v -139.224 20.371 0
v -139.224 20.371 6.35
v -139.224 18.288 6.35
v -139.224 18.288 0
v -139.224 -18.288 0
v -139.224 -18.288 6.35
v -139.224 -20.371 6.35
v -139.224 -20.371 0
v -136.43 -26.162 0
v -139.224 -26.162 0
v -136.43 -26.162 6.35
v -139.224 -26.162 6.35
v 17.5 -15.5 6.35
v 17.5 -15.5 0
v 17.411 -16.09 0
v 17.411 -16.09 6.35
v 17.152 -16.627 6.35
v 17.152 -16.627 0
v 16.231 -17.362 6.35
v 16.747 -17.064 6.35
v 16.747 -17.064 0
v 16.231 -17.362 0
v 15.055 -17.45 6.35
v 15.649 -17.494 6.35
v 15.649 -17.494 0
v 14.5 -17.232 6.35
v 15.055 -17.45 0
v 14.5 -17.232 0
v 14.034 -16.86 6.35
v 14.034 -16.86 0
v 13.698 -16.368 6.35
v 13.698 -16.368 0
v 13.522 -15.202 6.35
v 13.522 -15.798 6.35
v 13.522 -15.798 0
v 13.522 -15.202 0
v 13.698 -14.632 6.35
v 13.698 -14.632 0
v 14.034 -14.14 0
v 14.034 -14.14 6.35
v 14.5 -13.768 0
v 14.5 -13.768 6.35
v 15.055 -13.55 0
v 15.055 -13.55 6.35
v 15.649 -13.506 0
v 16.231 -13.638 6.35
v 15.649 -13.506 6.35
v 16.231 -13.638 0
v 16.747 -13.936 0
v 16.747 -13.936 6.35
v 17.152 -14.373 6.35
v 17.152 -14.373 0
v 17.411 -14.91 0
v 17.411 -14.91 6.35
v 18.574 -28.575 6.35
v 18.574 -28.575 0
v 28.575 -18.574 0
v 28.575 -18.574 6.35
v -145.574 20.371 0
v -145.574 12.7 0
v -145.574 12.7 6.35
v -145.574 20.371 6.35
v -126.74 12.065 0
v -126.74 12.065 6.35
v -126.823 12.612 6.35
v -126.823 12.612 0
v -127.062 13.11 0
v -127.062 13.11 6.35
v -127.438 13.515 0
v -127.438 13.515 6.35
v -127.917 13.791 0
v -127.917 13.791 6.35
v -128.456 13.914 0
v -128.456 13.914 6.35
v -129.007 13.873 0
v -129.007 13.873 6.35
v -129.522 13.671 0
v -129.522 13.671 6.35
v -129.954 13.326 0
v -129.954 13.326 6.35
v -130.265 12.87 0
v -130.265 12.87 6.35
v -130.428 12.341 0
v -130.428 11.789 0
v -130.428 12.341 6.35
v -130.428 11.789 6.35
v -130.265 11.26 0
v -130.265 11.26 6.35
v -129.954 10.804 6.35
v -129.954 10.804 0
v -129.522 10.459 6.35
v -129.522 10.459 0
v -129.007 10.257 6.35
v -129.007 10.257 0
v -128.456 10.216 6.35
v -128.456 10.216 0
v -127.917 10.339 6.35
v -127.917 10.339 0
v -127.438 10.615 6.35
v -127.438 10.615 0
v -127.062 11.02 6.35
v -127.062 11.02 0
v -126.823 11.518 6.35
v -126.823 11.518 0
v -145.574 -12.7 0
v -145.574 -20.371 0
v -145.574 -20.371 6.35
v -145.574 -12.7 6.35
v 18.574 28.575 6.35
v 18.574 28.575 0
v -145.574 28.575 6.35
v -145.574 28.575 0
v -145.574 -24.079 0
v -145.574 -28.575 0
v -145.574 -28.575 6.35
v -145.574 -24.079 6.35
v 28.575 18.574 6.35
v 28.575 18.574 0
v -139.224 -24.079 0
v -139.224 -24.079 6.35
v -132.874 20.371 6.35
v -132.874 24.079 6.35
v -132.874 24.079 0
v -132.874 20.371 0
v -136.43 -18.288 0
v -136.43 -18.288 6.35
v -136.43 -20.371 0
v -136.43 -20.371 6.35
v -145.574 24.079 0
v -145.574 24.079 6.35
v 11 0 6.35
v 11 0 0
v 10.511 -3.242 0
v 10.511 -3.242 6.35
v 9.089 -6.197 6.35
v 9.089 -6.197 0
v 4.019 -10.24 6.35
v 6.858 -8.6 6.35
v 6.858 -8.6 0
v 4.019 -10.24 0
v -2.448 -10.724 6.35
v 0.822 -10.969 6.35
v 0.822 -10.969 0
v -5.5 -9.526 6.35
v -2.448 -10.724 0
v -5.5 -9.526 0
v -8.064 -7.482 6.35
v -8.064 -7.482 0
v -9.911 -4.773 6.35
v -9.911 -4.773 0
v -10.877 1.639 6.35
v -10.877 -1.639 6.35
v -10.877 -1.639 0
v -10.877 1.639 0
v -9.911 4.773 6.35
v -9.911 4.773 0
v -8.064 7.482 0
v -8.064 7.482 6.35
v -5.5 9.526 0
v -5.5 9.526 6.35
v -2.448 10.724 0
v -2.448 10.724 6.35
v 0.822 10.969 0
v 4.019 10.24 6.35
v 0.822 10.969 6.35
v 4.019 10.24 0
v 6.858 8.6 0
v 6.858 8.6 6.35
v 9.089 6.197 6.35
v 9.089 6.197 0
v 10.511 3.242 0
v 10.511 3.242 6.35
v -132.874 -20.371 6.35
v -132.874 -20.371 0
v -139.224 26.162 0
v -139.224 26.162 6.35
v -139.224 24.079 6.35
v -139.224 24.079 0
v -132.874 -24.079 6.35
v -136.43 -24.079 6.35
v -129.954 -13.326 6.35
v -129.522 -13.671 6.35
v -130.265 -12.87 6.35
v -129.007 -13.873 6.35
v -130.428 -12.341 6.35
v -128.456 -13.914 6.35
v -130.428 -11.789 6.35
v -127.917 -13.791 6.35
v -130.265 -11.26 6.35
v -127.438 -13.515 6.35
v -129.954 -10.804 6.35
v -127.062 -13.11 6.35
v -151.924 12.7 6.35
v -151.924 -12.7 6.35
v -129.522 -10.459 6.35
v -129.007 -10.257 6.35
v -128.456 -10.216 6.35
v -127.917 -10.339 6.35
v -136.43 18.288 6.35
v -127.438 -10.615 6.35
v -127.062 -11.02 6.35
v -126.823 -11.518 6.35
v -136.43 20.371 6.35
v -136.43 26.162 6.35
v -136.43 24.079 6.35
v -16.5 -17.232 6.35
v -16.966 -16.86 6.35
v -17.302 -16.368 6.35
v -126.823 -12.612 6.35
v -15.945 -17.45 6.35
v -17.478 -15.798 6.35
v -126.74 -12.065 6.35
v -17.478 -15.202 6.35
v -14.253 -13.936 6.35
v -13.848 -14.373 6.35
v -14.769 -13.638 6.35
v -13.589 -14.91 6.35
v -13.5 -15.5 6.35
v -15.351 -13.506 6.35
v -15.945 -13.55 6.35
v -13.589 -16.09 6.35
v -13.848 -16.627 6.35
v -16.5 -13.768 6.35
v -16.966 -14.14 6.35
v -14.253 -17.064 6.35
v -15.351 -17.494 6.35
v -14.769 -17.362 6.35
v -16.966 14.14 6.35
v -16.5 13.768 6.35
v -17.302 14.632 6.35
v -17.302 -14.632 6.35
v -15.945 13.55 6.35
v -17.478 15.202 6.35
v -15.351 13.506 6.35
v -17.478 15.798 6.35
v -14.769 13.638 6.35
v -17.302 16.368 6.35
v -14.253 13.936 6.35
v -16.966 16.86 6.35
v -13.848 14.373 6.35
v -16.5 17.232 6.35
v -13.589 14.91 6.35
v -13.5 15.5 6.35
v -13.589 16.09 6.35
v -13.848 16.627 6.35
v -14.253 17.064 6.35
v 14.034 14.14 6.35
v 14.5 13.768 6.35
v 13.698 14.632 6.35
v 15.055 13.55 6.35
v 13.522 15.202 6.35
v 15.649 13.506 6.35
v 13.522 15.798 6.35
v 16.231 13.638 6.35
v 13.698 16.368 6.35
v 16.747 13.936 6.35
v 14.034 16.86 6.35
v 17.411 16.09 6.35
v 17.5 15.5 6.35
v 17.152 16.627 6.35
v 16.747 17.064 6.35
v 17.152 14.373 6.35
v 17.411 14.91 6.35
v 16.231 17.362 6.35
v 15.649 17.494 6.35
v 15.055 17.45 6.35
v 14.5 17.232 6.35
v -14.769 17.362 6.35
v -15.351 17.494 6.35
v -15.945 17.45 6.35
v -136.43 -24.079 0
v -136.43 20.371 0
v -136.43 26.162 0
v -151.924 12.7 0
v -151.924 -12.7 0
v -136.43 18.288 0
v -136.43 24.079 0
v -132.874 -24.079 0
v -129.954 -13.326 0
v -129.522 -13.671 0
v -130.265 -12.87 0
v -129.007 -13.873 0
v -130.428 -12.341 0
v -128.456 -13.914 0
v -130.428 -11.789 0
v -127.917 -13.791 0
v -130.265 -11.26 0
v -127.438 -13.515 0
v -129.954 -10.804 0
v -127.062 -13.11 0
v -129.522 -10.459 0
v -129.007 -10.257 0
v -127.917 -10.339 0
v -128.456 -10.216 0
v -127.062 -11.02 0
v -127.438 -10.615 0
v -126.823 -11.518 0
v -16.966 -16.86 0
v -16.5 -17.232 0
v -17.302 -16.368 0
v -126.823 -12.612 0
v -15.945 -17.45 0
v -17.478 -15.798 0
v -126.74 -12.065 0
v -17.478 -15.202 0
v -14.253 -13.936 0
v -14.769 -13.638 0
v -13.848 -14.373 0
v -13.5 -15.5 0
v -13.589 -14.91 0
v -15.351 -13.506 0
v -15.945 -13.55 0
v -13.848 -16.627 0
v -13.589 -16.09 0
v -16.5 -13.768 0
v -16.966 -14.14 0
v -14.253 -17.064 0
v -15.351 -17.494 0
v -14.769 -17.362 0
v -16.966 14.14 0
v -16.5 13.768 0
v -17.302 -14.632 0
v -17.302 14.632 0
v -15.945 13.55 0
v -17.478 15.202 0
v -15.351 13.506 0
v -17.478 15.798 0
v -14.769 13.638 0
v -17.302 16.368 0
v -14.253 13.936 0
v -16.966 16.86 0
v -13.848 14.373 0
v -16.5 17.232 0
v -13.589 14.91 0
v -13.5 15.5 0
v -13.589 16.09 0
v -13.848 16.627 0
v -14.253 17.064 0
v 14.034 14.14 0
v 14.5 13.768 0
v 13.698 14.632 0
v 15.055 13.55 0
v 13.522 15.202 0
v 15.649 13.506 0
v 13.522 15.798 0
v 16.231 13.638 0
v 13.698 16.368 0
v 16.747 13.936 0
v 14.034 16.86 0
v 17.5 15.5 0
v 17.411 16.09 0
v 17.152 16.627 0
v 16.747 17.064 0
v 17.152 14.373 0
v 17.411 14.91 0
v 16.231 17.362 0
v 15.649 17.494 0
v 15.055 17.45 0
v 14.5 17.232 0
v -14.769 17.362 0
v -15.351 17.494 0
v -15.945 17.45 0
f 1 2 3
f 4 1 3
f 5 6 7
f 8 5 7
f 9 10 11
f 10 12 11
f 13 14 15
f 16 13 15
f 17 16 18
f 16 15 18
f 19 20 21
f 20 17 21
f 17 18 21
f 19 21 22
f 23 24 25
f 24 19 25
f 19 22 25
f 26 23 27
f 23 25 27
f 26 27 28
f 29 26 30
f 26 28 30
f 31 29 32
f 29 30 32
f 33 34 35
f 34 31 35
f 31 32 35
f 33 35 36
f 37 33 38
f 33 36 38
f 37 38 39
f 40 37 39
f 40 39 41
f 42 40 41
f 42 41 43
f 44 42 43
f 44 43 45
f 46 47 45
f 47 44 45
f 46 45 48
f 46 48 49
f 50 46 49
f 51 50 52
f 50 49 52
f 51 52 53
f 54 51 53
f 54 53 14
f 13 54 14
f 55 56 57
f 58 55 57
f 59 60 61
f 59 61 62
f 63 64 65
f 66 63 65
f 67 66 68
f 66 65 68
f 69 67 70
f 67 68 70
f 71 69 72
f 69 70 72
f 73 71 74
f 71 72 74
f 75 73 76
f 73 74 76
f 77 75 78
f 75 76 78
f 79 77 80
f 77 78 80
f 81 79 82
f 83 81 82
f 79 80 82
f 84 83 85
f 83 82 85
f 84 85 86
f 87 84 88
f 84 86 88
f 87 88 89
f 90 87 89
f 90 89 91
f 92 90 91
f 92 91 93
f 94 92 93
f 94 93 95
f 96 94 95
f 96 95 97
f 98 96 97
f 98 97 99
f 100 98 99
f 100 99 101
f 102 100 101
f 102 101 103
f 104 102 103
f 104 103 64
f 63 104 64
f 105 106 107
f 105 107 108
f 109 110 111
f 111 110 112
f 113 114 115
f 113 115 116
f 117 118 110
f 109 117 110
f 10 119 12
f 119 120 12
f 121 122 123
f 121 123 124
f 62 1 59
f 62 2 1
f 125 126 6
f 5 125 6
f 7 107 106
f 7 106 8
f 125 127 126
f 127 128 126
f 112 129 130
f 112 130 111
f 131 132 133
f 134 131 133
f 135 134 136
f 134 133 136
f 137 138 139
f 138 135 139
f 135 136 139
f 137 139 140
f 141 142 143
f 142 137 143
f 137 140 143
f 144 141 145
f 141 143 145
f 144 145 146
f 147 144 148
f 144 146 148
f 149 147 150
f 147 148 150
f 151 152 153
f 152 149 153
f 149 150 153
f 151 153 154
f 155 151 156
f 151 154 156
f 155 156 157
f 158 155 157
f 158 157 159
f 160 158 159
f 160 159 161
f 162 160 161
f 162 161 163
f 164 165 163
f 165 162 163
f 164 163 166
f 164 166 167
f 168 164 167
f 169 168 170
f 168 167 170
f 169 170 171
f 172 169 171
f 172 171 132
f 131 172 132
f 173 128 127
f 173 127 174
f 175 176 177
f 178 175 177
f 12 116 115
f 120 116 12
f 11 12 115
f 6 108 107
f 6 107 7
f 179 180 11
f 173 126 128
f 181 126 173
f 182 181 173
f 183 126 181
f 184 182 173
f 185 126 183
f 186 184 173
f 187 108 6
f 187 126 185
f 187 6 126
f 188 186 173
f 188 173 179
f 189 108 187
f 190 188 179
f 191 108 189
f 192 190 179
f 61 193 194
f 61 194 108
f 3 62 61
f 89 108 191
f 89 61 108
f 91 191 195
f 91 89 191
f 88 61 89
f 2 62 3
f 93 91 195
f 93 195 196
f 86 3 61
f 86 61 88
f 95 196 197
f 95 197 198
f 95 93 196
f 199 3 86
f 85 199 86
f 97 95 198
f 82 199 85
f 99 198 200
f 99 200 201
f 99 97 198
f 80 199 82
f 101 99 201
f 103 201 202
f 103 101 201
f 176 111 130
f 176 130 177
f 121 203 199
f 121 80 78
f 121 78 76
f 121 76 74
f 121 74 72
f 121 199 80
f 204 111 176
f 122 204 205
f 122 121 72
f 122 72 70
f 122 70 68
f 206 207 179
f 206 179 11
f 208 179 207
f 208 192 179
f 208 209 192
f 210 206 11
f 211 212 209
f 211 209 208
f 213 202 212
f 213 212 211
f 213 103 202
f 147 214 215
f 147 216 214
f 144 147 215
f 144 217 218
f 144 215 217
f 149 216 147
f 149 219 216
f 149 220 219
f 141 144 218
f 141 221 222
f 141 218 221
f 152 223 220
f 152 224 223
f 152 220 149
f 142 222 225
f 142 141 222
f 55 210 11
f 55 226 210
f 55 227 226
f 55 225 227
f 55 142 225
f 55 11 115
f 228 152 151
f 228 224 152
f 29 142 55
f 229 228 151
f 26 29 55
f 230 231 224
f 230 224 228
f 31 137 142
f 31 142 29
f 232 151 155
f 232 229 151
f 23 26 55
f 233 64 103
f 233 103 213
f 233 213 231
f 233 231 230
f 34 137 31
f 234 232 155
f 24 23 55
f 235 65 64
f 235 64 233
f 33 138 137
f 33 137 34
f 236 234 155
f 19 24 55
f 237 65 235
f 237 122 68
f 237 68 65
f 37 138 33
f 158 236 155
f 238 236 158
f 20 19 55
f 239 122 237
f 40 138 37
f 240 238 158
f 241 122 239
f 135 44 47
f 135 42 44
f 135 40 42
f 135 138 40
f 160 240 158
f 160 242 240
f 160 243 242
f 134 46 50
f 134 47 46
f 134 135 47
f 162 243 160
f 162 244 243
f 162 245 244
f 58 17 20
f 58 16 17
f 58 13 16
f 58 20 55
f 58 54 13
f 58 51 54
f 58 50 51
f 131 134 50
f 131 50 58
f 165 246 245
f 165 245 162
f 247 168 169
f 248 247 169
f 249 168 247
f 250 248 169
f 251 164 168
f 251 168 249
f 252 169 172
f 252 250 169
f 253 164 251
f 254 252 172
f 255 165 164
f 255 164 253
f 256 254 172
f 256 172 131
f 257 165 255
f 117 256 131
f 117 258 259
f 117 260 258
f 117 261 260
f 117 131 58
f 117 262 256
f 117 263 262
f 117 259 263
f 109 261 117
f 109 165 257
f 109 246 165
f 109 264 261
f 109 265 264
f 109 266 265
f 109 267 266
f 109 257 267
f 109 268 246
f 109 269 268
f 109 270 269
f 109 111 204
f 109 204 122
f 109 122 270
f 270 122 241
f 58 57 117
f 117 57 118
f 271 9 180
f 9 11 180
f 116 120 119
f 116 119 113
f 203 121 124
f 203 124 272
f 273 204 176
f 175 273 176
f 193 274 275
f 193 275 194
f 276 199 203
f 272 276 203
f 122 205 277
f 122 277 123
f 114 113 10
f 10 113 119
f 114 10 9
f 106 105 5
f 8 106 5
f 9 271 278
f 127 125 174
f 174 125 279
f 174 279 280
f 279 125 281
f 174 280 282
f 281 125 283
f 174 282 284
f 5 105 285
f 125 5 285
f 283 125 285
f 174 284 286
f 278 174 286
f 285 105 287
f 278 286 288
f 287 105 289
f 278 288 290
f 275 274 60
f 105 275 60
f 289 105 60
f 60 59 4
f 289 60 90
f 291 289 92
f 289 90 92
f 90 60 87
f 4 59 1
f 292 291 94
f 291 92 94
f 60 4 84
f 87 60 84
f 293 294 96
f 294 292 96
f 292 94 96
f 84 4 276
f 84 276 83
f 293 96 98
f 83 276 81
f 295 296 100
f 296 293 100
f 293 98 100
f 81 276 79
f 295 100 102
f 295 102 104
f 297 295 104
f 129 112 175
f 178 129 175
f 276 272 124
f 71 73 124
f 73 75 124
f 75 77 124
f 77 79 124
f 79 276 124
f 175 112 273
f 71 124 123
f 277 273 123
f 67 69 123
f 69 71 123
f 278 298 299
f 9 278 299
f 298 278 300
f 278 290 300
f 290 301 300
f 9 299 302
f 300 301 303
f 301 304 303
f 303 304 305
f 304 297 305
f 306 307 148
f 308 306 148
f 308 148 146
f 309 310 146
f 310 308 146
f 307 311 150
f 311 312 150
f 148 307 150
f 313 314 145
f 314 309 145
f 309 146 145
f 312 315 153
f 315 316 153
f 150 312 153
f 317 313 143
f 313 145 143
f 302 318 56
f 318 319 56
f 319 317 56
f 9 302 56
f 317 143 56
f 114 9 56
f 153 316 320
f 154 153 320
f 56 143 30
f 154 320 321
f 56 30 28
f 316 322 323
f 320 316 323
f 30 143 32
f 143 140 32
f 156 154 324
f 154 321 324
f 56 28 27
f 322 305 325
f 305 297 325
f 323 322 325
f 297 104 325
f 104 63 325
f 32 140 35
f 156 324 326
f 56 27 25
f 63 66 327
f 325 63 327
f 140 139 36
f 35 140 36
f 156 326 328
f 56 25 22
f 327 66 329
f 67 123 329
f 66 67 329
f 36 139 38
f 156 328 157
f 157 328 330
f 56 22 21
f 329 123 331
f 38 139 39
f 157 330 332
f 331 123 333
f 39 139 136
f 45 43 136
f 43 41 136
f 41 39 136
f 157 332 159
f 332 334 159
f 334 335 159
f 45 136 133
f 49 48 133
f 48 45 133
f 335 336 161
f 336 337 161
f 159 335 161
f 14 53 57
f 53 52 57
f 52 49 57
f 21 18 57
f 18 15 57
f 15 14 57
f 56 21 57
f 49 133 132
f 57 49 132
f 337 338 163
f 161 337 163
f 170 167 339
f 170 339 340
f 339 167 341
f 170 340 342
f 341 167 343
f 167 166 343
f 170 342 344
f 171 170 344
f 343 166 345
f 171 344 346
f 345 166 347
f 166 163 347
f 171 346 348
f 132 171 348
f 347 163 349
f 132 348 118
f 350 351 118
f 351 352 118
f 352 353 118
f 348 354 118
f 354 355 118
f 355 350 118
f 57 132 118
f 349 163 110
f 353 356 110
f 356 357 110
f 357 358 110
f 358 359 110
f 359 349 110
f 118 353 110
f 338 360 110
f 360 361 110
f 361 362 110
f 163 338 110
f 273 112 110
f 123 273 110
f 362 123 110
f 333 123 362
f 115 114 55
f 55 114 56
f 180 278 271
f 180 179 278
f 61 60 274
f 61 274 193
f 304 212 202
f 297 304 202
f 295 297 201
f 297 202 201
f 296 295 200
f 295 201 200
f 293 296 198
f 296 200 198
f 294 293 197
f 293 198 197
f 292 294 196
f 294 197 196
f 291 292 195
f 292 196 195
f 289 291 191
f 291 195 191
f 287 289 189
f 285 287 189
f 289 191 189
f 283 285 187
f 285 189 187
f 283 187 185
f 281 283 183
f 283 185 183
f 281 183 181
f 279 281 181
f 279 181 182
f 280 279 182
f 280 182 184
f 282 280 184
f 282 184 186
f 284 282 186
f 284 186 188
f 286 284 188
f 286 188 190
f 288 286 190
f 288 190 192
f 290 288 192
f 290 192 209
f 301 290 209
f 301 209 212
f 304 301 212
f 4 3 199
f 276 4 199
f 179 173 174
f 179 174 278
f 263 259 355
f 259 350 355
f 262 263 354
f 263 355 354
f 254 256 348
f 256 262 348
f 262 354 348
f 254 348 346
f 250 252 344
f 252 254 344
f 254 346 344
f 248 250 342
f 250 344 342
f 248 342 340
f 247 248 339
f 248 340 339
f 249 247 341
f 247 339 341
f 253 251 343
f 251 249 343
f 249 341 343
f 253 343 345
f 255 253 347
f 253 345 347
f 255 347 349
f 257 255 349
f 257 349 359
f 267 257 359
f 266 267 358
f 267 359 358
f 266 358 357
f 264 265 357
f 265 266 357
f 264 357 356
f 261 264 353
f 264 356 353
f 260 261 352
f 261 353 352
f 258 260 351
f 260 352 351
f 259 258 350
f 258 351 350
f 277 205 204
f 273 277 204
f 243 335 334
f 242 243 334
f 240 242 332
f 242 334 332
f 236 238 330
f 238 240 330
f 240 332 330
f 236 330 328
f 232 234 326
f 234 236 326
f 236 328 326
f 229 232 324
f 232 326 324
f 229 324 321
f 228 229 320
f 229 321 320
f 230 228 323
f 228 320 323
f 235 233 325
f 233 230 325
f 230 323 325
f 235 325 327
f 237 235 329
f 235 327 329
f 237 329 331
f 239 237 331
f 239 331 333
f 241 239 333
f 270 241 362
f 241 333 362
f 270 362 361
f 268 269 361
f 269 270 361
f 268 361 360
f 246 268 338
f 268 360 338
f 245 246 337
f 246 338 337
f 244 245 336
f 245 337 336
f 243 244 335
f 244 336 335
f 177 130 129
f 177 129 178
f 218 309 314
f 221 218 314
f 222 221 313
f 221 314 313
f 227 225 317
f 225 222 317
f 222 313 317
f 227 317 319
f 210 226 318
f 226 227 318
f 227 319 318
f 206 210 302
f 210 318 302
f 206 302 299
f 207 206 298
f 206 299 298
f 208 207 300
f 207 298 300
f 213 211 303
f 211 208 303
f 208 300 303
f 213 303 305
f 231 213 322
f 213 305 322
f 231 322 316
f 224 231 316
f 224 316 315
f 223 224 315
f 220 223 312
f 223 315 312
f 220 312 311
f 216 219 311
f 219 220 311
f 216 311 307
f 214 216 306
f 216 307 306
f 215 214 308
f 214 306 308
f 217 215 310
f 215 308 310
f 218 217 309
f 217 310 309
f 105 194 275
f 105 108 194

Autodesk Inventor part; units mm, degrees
ref_plane "YZ Plane" through (0, 0, 0) normal (1, 0, 0) x (0, 1, 0)
ref_plane "XZ Plane" through (0, 0, 0) normal (0, 1, 0) x (-1, 0, 0)
ref_plane "XY Plane" through (0, 0, 0) normal (0, 0, 1) x (1, 0, 0)
sketch "Sketch1" plane through (0, 0, 0) normal (0, 0, 1) x (1, 0, 0)
  circle A0 centre (15.5, -15.5) radius 2 projected
  circle A1 centre (-15.5, -15.5) radius 2 projected
  circle A2 centre (15.5, 15.5) radius 2 projected
  circle A3 centre (-15.5, 15.5) radius 2 projected
  line L0 (-21.15, 15.4985) -> (-15.4985, 21.15) projected
  line L1 (-15.4985, 21.15) -> (15.4985, 21.15) projected
  line L2 (15.4985, 21.15) -> (21.15, 15.4985) projected
  line L3 (21.15, 15.4985) -> (21.15, -15.4985) projected
  line L4 (21.15, -15.4985) -> (15.4985, -21.15) projected
  line L5 (15.4985, -21.15) -> (-15.4985, -21.15) projected
  line L6 (-15.4985, -21.15) -> (-21.15, -15.4985) projected
  line L7 (-21.15, -15.4985) -> (-21.15, 15.4985) projected
  line L8 (28.575, -18.574) -> (28.575, 18.574)
  line L9 (28.575, 18.574) -> (18.574, 28.575)
  line L10 (18.574, 28.575) -> (-18.574, 28.575)
  line L11 (-18.574, 28.575) -> (-28.575, 18.574)
  line L12 (-28.575, 18.574) -> (-28.575, -18.574)
  line L13 (-28.575, -18.574) -> (-18.574, -28.575)
  line L14 (-18.574, -28.575) -> (18.574, -28.575)
  line L15 (18.574, -28.575) -> (28.575, -18.574)
  line L16 (-18.574, -28.575) -> (-145.574, -28.575)
  line L17 (-145.574, -28.575) -> (-145.574, 28.575)
  line L18 (-145.574, 28.575) -> (-18.574, 28.575)
  line L19 (-18.574, 28.575) -> (-18.574, -28.575)
  circle A4 centre (0, 0) radius 11 projected
  dimension "d0" = 127
  dimension "d1" = 57.15
  dimension "d2" = 57.15
extrude "Extrusion1" add sketch "Sketch1" along normal blind 6.35
sketch "Sketch2" plane through (0, 0, 6.35) normal (0, 0, 1) x (1, 0, 0)
  line L0 (-130.4486, -16.3493) -> (-130.4486, -9.9993) projected
  line L1 (-126.7402, -9.9993) -> (-126.7402, -16.3493) projected
  line L2 (-130.4486, 9.0507) -> (-130.4486, 15.4007) projected
  line L3 (-126.7402, 15.4007) -> (-126.7402, 9.0507) projected
  line L4 (-126.7402, 12.7) -> (-130.4486, 12.7) construction
  line L5 (-126.7402, -12.7) -> (-130.9009, -12.7) construction
  circle A0 centre (-128.5944, 12.065) radius 1.8542 projected
  circle A1 centre (-128.5944, -12.065) radius 1.8542 projected
extrude "Extrusion2" cut sketch "Sketch2" against normal through all
sketch "Sketch3" plane through (0, 0, 6.35) normal (0, 0, 1) x (1, 0, 0)
  line L0 (-145.574, -28.575) -> (-145.574, 28.575) projected
  line L1 (-151.924, 20.3708) -> (-151.924, 24.0792) projected
  line L2 (-151.924, -24.5535) -> (-151.924, -20.8451) projected
  line L3 (-131.1543, 22.225) -> (-145.574, 22.225) construction
  line L4 (-131.1543, -22.225) -> (-145.574, -22.225) construction
  line L5 (-145.574, -20.3708) -> (-132.874, -20.3708)
  line L6 (-132.874, -20.3708) -> (-132.874, -24.0792)
  line L7 (-132.874, -24.0792) -> (-145.574, -24.0792)
  line L8 (-145.574, -24.0792) -> (-145.574, -20.3708)
  line L9 (-145.574, 24.0792) -> (-132.874, 24.0792)
  line L10 (-132.874, 24.0792) -> (-132.874, 20.3708)
  line L11 (-132.874, 20.3708) -> (-145.574, 20.3708)
  line L12 (-145.574, 20.3708) -> (-145.574, 24.0792)
  line L13 (-136.43, 26.162) -> (-139.224, 26.162)
  line L14 (-139.224, 26.162) -> (-139.224, 18.288)
  line L15 (-139.224, 18.288) -> (-136.43, 18.288)
  line L16 (-136.43, 18.288) -> (-136.43, 26.162)
  line L17 (-136.43, -18.288) -> (-139.224, -18.288)
  line L18 (-139.224, -18.288) -> (-139.224, -26.162)
  line L19 (-139.224, -26.162) -> (-136.43, -26.162)
  line L20 (-136.43, -26.162) -> (-136.43, -18.288)
  dimension "d9" = 12.7
  dimension "d10" = 2.794
  dimension "d11" = 7.874
  dimension "d12" = 3.937
  dimension "d13" = 3.937
  dimension "d14" = 7.874
  dimension "d15" = 3.937
  dimension "d16" = 3.937
  dimension "d17" = 6.35
  dimension "d18" = 6.35
  dimension "d19" = 2.794
extrude "Extrusion3" cut sketch "Sketch3" against normal through all
sketch "Sketch4" plane through (-145.574, -20.3708, 0) normal (-1, 0, 0) x (0, 0, 1)
  line L0 (6.35, 33.0708) -> (6.35, 7.6708) projected
  line L1 (6.35, 7.6708) -> (0, 7.6708) projected
  line L2 (0, 7.6708) -> (0, 33.0708) projected
  line L3 (0, 33.0708) -> (6.35, 33.0708) projected
  point P0 (0, 20.3708)
extrude "Extrusion4" add sketch "Sketch4" along normal blind 6.35
equation "\"d2\" = d1"
equation "\"d12\" = d13"
equation "\"d15\" = d16"
properties part number "tiltColumnNonStepperSide02_RB01" material "Titanium"
